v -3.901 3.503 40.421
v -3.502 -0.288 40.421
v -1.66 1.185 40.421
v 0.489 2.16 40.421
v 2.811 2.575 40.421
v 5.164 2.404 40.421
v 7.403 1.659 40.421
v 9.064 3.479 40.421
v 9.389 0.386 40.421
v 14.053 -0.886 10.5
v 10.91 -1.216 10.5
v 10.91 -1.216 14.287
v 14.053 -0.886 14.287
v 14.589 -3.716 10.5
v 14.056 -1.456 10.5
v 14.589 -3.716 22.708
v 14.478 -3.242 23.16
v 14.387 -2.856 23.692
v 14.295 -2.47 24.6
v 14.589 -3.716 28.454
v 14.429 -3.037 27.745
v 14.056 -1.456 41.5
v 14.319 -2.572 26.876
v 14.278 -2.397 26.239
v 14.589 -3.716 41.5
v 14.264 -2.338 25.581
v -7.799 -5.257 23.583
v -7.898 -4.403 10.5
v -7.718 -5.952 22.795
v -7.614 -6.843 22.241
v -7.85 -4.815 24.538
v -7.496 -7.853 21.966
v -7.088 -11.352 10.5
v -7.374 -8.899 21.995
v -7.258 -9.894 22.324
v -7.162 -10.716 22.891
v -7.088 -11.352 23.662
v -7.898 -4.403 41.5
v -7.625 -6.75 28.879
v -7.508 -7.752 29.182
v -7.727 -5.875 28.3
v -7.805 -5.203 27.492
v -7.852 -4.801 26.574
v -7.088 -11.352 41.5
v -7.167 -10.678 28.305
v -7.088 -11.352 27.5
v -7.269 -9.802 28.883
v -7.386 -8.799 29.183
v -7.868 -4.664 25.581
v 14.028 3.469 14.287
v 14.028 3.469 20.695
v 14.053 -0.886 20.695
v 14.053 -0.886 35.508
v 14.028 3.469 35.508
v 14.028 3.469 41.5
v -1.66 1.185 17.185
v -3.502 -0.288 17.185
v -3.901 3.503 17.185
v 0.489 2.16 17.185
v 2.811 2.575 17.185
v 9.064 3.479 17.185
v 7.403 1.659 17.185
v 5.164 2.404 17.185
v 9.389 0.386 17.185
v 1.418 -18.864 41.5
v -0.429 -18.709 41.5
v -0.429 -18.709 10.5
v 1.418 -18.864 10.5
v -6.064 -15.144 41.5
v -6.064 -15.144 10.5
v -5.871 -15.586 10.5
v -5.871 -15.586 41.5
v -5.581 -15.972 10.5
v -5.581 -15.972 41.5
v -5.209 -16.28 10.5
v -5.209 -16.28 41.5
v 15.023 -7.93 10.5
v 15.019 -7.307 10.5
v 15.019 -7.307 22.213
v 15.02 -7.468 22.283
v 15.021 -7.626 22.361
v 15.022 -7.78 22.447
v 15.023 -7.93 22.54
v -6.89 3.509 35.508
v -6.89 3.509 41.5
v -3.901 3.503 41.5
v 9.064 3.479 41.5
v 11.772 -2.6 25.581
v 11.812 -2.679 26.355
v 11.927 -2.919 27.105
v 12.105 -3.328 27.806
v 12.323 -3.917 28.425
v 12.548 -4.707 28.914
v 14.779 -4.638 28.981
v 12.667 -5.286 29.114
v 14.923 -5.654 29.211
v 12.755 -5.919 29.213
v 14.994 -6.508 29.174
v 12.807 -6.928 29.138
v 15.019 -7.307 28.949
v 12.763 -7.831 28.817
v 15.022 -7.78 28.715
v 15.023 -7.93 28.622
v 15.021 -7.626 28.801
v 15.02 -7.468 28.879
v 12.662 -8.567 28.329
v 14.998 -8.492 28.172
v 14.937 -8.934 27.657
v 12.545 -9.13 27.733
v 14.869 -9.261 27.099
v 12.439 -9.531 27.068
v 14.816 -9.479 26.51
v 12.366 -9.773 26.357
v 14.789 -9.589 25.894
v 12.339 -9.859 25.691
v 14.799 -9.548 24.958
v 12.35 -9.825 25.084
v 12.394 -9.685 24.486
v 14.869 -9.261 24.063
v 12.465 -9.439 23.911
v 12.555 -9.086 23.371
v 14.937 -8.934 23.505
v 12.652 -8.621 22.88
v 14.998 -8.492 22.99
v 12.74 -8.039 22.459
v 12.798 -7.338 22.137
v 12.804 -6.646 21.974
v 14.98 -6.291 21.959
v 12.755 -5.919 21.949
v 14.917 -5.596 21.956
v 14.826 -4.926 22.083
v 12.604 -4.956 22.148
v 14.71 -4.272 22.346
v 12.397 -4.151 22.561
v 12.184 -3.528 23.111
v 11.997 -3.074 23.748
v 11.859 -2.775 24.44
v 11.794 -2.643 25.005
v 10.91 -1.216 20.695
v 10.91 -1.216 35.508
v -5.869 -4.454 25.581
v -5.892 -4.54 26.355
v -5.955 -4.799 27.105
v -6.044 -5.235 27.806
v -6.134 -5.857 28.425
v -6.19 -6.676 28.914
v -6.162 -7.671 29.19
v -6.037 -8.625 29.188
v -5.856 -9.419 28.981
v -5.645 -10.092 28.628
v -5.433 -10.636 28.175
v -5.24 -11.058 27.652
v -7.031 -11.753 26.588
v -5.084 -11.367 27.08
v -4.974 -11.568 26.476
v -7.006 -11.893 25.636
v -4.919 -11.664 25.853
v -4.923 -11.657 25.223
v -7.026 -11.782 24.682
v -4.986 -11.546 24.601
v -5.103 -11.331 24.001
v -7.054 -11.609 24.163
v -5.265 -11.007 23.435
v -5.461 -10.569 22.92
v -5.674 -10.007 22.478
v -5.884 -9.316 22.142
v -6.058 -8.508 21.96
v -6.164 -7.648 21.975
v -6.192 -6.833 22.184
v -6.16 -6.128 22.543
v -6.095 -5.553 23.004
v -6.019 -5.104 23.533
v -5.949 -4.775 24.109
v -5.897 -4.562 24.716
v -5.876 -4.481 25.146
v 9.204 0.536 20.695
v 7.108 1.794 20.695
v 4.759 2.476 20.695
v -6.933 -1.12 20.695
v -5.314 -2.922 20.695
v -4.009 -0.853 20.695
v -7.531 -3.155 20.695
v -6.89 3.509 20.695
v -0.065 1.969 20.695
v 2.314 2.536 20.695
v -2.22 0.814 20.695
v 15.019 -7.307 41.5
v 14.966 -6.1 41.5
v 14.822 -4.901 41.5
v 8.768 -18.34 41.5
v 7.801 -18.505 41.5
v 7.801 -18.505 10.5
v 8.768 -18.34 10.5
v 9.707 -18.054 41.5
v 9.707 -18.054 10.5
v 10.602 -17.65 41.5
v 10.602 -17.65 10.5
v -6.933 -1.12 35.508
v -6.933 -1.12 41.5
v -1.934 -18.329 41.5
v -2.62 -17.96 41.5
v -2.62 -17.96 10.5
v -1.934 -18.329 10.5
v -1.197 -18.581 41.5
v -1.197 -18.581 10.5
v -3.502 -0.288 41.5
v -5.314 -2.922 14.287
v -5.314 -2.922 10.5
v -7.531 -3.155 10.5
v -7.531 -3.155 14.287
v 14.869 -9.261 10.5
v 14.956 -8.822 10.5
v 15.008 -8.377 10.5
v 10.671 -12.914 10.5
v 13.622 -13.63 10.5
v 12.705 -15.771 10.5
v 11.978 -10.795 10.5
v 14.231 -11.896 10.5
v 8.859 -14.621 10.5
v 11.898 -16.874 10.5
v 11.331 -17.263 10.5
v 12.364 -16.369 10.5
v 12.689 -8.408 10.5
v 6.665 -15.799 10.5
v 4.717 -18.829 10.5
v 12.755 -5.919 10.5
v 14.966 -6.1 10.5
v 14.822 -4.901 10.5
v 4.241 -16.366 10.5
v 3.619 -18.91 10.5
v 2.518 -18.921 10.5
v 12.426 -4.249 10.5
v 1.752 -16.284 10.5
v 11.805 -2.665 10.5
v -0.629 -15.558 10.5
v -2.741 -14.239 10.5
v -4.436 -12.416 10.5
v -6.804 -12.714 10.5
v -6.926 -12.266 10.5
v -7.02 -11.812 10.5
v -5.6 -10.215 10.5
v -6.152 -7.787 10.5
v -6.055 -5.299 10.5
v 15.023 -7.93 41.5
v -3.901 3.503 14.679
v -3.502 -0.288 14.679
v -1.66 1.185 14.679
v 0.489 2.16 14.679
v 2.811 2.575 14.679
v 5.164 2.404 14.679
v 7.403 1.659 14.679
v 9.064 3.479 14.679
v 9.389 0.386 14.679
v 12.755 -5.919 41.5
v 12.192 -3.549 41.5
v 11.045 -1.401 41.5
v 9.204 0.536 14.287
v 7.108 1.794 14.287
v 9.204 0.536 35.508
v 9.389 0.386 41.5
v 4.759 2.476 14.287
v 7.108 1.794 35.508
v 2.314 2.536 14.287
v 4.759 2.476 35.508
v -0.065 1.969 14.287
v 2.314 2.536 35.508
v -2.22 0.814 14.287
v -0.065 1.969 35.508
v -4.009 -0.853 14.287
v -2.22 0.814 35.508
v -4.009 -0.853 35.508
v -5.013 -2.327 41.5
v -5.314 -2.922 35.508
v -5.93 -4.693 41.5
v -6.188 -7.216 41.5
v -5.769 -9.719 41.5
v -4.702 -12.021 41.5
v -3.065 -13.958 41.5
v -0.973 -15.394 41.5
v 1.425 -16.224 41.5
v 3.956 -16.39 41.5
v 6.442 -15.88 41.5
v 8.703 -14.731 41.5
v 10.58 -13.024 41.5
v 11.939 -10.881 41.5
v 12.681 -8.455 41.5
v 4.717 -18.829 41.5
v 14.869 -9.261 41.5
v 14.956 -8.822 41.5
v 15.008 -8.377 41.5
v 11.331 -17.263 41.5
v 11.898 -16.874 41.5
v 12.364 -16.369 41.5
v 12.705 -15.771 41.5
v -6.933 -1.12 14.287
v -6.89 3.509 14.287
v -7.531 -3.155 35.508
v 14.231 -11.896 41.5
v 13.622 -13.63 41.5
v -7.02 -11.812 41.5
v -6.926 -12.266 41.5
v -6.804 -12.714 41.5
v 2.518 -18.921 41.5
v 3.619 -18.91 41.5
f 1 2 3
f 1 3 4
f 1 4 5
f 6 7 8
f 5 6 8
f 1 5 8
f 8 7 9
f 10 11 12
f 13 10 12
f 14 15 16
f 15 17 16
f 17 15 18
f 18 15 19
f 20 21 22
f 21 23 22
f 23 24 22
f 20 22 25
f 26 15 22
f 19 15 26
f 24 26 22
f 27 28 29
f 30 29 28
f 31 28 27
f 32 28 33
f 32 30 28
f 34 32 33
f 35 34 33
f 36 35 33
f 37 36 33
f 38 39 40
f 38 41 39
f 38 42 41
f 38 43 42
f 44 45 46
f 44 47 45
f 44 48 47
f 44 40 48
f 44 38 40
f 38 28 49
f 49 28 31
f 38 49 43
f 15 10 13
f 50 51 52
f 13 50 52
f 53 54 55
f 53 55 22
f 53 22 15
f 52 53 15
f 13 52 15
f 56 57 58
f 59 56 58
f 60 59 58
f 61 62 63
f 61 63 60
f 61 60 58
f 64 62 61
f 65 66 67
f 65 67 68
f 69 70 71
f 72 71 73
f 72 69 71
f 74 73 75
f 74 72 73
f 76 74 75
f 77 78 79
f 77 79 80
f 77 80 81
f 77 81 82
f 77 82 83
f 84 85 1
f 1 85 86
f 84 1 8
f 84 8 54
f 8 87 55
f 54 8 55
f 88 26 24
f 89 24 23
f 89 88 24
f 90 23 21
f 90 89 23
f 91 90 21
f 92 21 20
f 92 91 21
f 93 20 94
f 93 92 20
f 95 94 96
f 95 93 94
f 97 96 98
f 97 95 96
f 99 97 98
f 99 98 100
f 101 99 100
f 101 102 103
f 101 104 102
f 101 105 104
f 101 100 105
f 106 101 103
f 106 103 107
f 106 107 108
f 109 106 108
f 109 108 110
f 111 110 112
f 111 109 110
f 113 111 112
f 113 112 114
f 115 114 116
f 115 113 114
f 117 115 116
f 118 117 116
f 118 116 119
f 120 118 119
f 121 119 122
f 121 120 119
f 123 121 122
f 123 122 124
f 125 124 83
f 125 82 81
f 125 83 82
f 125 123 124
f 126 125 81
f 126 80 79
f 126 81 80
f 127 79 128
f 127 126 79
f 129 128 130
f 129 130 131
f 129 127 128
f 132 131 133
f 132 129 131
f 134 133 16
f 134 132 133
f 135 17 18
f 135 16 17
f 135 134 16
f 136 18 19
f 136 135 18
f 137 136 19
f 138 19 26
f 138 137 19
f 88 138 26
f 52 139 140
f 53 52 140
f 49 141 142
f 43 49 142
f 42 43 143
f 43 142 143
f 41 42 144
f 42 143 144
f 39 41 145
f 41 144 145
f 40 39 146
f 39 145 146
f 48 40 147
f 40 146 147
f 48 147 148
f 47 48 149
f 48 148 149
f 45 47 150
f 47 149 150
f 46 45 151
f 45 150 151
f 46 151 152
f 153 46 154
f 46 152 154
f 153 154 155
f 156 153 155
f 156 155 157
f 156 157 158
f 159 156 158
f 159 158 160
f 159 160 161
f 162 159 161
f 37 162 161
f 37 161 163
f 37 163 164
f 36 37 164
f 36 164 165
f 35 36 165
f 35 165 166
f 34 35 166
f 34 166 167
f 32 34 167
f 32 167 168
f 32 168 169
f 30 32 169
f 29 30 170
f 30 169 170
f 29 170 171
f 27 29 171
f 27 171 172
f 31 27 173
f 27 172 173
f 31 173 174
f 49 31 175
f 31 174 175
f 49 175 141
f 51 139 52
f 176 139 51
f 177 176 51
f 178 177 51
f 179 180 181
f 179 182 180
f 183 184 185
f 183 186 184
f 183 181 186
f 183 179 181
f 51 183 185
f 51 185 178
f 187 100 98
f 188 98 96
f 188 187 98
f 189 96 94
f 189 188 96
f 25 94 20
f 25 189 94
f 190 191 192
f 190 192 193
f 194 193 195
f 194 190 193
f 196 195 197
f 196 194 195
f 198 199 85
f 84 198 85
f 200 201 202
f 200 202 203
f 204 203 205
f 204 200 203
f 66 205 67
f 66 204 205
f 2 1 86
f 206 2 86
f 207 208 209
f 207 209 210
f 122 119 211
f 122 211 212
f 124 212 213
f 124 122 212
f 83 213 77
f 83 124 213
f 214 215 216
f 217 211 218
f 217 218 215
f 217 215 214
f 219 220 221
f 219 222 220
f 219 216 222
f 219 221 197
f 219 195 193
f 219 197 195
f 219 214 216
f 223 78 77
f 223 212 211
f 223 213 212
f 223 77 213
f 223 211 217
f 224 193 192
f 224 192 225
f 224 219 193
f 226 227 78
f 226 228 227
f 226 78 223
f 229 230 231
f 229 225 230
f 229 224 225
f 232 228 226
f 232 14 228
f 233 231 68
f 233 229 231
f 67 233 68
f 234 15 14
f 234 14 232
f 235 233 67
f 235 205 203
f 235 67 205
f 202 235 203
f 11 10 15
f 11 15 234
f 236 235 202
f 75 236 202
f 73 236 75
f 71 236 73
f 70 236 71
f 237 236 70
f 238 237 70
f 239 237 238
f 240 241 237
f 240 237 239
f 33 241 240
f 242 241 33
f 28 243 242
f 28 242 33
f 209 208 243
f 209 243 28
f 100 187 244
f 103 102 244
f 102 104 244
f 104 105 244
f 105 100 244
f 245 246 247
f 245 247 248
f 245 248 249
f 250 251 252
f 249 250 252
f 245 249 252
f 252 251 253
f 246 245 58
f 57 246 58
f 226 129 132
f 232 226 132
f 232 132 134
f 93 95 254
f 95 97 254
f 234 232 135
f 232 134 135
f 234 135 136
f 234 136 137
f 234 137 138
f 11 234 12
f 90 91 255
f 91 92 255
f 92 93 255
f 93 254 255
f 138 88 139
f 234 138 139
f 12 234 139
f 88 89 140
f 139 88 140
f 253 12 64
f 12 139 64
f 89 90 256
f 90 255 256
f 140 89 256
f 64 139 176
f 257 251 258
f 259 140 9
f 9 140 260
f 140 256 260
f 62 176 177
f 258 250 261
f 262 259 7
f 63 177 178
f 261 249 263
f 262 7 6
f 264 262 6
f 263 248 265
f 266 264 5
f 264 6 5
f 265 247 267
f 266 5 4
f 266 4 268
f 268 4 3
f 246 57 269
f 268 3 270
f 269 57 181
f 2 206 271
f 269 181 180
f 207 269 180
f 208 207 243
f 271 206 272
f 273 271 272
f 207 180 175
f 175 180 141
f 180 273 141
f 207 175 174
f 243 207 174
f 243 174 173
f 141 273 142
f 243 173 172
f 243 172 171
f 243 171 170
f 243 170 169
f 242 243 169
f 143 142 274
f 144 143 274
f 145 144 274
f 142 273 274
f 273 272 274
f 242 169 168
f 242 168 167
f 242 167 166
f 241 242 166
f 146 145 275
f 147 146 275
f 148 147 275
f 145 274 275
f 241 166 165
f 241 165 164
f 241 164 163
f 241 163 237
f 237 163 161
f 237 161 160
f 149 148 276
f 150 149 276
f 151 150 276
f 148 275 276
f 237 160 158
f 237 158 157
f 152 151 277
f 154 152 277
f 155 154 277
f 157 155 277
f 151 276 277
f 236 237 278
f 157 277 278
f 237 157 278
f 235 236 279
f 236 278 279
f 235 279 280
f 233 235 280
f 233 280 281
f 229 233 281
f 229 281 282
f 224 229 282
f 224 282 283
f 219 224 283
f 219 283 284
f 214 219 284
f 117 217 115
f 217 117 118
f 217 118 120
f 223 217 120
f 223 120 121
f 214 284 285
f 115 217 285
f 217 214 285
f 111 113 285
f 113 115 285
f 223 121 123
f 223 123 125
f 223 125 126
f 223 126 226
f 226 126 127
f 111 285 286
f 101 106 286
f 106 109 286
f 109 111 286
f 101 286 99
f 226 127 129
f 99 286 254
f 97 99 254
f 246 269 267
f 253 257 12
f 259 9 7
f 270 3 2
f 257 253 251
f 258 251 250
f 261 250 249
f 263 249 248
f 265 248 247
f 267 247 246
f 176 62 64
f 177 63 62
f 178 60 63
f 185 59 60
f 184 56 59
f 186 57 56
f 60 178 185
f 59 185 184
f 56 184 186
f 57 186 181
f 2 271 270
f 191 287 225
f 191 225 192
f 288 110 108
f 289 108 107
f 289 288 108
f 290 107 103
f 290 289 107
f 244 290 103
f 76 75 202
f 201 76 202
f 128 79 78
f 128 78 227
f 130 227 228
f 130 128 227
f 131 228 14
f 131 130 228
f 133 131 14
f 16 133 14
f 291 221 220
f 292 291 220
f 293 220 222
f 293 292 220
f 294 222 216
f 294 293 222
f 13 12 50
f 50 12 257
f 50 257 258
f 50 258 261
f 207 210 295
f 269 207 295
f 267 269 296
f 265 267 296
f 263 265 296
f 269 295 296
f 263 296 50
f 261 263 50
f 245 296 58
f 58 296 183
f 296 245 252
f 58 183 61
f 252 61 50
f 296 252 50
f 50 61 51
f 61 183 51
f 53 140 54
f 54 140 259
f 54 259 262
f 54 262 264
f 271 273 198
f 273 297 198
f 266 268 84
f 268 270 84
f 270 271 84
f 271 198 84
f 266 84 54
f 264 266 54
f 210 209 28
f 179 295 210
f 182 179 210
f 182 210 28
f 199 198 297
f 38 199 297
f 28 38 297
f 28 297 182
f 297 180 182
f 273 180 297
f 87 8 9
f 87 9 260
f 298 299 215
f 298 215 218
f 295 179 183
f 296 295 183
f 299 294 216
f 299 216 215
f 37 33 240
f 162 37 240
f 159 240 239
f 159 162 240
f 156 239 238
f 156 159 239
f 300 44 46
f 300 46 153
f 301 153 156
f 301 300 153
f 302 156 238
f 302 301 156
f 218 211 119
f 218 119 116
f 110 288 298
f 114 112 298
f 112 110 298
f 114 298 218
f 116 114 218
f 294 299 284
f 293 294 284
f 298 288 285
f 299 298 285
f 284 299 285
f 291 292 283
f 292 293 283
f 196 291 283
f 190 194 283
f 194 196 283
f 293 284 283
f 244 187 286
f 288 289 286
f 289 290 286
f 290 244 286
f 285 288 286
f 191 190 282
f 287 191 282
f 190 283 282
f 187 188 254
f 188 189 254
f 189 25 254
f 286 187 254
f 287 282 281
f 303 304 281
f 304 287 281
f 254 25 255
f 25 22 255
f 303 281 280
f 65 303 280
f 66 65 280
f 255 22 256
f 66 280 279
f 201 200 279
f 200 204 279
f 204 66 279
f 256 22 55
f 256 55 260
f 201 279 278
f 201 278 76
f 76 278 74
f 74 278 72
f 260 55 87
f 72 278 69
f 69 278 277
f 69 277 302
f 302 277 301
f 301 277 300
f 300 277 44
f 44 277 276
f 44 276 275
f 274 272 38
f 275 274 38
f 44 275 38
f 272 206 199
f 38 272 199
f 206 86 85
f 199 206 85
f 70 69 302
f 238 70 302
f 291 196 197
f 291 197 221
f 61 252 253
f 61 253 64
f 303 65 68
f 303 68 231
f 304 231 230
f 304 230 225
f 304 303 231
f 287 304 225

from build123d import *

# Parameters (mm, degrees)
SKETCH786_R             = 9.5
PAD342_DEPTH            = 31
SKETCH800_R             = 3.640093
SKETCH800_W             = 8.018949
SKETCH800_H             = 14.81283
SKETCH800_H_2           = 4.909163
POCKET216_DEPTH         = 8.316326
POCKET216_DEPTH_BACK    = 14.315221
SKETCH801_W             = 12.891265
SKETCH801_H             = 2.411679
SKETCH801_H_2           = 1.655072
SKETCH801_H_3           = 2.506252
SKETCH801_H_4           = 2.364388
POCKET217_DEPTH         = 14.211133
BODY063_PLACEMENT_ANGLE = 6


with BuildPart() as part:
    # Sketch786 → Pad342 (new body)
    with BuildSketch(Plane.XY.offset(62)):
        with BuildLine():
            Line((-6.48502, 14.210133), (14.314221, 11.983735))
            Line((14.314221, 11.983735), (13.827026, 7.082384))
            Line((13.827026, 7.082384), (14.121025, 4.779397))
            ThreePointArc((14.172916, 1.163416), (14.248889, 2.972869), (14.121025, 4.779397))
            Line((14.172916, 1.163416), (14.111788, 0.543408))
            ThreePointArc((13.818994, -0.764609), (14.005316, -0.119537), (14.111788, 0.543408))
            Line((13.818994, -0.764609), (12.909272, -3.318828))
            Line((12.122626, -4.979527), (12.909272, -3.318828))
            Line((10.986399, -7.012774), (12.122626, -4.979527))
            ThreePointArc((9.464654, -8.352981), (10.340262, -7.813155), (10.986399, -7.012774))
            Line((8.698858, -8.661427), (9.464654, -8.352981))
            ThreePointArc((5.823821, -9.218676), (7.288092, -9.078079), (8.698858, -8.661427))
            Line((2.72265, -9.218676), (5.823821, -9.218676))
            ThreePointArc((-0.561662, -8.908793), (1.073201, -9.141034), (2.72265, -9.218676))
            Line((-2.382517, -8.562102), (-0.561662, -8.908793))
            ThreePointArc((-4.482526, -7.588171), (-3.492747, -8.204996), (-2.382517, -8.562102))
            Line((-6.882625, -5.64591), (-4.482526, -7.588171))
            ThreePointArc((-7.614123, -4.427153), (-7.356079, -5.101176), (-6.882625, -5.64591))
            Line((-7.614123, -4.427153), (-8.095536, -1.933202))
            ThreePointArc((-8.235814, -0.549404), (-8.196714, -1.24445), (-8.095536, -1.933202))
            Line((-8.315326, 6.446385), (-8.235814, -0.549404))
            Line((-7.012325, 9.610864), (-8.315326, 6.446385))
            Line((-7.012325, 9.610864), (-6.48502, 14.210133))
        make_face()
        with Locations((2.566633, 2.779747)):
            Circle(SKETCH786_R, mode=Mode.SUBTRACT)
    extrude(amount=-PAD342_DEPTH)

    # Sketch800 → Pocket216 (cut, two sides)
    with BuildSketch(Plane.YZ) as pocket216_sk:
        with Locations((2.543955, 46.080971)):
            Circle(SKETCH800_R)
        with Locations((11.659285, 48.601678)):
            Rectangle(SKETCH800_W, SKETCH800_H)
        with Locations((11.659285, 32.332169)):
            Rectangle(SKETCH800_W, SKETCH800_H_2)
    extrude(amount=-POCKET216_DEPTH, mode=Mode.SUBTRACT)
    extrude(pocket216_sk.sketch, amount=POCKET216_DEPTH_BACK, mode=Mode.SUBTRACT)

    # Sketch801 → Pocket217 (cut, through all)
    with BuildSketch(Plane.XZ):
        with Locations((2.932228, 62.127093)):
            Rectangle(SKETCH801_W, SKETCH801_H)
        with Locations((2.932228, 30.93466)):
            Rectangle(SKETCH801_W, SKETCH801_H_2)
        with Locations((2.932228, 36.431635)):
            Rectangle(SKETCH801_W, SKETCH801_H_3)
        with Locations((2.932228, 53.693306)):
            Rectangle(SKETCH801_W, SKETCH801_H_4)
    extrude(amount=-POCKET217_DEPTH, mode=Mode.SUBTRACT)


with BuildPart() as part_1:
    # Body063 placement: moved
    add(part.part.moved(Location((1.045285, -9.945219, -20.5))).rotate(Axis((1.045285, -9.945219, -20.5), (0, 0, 1)), BODY063_PLACEMENT_ANGLE))


solid = part_1.part
